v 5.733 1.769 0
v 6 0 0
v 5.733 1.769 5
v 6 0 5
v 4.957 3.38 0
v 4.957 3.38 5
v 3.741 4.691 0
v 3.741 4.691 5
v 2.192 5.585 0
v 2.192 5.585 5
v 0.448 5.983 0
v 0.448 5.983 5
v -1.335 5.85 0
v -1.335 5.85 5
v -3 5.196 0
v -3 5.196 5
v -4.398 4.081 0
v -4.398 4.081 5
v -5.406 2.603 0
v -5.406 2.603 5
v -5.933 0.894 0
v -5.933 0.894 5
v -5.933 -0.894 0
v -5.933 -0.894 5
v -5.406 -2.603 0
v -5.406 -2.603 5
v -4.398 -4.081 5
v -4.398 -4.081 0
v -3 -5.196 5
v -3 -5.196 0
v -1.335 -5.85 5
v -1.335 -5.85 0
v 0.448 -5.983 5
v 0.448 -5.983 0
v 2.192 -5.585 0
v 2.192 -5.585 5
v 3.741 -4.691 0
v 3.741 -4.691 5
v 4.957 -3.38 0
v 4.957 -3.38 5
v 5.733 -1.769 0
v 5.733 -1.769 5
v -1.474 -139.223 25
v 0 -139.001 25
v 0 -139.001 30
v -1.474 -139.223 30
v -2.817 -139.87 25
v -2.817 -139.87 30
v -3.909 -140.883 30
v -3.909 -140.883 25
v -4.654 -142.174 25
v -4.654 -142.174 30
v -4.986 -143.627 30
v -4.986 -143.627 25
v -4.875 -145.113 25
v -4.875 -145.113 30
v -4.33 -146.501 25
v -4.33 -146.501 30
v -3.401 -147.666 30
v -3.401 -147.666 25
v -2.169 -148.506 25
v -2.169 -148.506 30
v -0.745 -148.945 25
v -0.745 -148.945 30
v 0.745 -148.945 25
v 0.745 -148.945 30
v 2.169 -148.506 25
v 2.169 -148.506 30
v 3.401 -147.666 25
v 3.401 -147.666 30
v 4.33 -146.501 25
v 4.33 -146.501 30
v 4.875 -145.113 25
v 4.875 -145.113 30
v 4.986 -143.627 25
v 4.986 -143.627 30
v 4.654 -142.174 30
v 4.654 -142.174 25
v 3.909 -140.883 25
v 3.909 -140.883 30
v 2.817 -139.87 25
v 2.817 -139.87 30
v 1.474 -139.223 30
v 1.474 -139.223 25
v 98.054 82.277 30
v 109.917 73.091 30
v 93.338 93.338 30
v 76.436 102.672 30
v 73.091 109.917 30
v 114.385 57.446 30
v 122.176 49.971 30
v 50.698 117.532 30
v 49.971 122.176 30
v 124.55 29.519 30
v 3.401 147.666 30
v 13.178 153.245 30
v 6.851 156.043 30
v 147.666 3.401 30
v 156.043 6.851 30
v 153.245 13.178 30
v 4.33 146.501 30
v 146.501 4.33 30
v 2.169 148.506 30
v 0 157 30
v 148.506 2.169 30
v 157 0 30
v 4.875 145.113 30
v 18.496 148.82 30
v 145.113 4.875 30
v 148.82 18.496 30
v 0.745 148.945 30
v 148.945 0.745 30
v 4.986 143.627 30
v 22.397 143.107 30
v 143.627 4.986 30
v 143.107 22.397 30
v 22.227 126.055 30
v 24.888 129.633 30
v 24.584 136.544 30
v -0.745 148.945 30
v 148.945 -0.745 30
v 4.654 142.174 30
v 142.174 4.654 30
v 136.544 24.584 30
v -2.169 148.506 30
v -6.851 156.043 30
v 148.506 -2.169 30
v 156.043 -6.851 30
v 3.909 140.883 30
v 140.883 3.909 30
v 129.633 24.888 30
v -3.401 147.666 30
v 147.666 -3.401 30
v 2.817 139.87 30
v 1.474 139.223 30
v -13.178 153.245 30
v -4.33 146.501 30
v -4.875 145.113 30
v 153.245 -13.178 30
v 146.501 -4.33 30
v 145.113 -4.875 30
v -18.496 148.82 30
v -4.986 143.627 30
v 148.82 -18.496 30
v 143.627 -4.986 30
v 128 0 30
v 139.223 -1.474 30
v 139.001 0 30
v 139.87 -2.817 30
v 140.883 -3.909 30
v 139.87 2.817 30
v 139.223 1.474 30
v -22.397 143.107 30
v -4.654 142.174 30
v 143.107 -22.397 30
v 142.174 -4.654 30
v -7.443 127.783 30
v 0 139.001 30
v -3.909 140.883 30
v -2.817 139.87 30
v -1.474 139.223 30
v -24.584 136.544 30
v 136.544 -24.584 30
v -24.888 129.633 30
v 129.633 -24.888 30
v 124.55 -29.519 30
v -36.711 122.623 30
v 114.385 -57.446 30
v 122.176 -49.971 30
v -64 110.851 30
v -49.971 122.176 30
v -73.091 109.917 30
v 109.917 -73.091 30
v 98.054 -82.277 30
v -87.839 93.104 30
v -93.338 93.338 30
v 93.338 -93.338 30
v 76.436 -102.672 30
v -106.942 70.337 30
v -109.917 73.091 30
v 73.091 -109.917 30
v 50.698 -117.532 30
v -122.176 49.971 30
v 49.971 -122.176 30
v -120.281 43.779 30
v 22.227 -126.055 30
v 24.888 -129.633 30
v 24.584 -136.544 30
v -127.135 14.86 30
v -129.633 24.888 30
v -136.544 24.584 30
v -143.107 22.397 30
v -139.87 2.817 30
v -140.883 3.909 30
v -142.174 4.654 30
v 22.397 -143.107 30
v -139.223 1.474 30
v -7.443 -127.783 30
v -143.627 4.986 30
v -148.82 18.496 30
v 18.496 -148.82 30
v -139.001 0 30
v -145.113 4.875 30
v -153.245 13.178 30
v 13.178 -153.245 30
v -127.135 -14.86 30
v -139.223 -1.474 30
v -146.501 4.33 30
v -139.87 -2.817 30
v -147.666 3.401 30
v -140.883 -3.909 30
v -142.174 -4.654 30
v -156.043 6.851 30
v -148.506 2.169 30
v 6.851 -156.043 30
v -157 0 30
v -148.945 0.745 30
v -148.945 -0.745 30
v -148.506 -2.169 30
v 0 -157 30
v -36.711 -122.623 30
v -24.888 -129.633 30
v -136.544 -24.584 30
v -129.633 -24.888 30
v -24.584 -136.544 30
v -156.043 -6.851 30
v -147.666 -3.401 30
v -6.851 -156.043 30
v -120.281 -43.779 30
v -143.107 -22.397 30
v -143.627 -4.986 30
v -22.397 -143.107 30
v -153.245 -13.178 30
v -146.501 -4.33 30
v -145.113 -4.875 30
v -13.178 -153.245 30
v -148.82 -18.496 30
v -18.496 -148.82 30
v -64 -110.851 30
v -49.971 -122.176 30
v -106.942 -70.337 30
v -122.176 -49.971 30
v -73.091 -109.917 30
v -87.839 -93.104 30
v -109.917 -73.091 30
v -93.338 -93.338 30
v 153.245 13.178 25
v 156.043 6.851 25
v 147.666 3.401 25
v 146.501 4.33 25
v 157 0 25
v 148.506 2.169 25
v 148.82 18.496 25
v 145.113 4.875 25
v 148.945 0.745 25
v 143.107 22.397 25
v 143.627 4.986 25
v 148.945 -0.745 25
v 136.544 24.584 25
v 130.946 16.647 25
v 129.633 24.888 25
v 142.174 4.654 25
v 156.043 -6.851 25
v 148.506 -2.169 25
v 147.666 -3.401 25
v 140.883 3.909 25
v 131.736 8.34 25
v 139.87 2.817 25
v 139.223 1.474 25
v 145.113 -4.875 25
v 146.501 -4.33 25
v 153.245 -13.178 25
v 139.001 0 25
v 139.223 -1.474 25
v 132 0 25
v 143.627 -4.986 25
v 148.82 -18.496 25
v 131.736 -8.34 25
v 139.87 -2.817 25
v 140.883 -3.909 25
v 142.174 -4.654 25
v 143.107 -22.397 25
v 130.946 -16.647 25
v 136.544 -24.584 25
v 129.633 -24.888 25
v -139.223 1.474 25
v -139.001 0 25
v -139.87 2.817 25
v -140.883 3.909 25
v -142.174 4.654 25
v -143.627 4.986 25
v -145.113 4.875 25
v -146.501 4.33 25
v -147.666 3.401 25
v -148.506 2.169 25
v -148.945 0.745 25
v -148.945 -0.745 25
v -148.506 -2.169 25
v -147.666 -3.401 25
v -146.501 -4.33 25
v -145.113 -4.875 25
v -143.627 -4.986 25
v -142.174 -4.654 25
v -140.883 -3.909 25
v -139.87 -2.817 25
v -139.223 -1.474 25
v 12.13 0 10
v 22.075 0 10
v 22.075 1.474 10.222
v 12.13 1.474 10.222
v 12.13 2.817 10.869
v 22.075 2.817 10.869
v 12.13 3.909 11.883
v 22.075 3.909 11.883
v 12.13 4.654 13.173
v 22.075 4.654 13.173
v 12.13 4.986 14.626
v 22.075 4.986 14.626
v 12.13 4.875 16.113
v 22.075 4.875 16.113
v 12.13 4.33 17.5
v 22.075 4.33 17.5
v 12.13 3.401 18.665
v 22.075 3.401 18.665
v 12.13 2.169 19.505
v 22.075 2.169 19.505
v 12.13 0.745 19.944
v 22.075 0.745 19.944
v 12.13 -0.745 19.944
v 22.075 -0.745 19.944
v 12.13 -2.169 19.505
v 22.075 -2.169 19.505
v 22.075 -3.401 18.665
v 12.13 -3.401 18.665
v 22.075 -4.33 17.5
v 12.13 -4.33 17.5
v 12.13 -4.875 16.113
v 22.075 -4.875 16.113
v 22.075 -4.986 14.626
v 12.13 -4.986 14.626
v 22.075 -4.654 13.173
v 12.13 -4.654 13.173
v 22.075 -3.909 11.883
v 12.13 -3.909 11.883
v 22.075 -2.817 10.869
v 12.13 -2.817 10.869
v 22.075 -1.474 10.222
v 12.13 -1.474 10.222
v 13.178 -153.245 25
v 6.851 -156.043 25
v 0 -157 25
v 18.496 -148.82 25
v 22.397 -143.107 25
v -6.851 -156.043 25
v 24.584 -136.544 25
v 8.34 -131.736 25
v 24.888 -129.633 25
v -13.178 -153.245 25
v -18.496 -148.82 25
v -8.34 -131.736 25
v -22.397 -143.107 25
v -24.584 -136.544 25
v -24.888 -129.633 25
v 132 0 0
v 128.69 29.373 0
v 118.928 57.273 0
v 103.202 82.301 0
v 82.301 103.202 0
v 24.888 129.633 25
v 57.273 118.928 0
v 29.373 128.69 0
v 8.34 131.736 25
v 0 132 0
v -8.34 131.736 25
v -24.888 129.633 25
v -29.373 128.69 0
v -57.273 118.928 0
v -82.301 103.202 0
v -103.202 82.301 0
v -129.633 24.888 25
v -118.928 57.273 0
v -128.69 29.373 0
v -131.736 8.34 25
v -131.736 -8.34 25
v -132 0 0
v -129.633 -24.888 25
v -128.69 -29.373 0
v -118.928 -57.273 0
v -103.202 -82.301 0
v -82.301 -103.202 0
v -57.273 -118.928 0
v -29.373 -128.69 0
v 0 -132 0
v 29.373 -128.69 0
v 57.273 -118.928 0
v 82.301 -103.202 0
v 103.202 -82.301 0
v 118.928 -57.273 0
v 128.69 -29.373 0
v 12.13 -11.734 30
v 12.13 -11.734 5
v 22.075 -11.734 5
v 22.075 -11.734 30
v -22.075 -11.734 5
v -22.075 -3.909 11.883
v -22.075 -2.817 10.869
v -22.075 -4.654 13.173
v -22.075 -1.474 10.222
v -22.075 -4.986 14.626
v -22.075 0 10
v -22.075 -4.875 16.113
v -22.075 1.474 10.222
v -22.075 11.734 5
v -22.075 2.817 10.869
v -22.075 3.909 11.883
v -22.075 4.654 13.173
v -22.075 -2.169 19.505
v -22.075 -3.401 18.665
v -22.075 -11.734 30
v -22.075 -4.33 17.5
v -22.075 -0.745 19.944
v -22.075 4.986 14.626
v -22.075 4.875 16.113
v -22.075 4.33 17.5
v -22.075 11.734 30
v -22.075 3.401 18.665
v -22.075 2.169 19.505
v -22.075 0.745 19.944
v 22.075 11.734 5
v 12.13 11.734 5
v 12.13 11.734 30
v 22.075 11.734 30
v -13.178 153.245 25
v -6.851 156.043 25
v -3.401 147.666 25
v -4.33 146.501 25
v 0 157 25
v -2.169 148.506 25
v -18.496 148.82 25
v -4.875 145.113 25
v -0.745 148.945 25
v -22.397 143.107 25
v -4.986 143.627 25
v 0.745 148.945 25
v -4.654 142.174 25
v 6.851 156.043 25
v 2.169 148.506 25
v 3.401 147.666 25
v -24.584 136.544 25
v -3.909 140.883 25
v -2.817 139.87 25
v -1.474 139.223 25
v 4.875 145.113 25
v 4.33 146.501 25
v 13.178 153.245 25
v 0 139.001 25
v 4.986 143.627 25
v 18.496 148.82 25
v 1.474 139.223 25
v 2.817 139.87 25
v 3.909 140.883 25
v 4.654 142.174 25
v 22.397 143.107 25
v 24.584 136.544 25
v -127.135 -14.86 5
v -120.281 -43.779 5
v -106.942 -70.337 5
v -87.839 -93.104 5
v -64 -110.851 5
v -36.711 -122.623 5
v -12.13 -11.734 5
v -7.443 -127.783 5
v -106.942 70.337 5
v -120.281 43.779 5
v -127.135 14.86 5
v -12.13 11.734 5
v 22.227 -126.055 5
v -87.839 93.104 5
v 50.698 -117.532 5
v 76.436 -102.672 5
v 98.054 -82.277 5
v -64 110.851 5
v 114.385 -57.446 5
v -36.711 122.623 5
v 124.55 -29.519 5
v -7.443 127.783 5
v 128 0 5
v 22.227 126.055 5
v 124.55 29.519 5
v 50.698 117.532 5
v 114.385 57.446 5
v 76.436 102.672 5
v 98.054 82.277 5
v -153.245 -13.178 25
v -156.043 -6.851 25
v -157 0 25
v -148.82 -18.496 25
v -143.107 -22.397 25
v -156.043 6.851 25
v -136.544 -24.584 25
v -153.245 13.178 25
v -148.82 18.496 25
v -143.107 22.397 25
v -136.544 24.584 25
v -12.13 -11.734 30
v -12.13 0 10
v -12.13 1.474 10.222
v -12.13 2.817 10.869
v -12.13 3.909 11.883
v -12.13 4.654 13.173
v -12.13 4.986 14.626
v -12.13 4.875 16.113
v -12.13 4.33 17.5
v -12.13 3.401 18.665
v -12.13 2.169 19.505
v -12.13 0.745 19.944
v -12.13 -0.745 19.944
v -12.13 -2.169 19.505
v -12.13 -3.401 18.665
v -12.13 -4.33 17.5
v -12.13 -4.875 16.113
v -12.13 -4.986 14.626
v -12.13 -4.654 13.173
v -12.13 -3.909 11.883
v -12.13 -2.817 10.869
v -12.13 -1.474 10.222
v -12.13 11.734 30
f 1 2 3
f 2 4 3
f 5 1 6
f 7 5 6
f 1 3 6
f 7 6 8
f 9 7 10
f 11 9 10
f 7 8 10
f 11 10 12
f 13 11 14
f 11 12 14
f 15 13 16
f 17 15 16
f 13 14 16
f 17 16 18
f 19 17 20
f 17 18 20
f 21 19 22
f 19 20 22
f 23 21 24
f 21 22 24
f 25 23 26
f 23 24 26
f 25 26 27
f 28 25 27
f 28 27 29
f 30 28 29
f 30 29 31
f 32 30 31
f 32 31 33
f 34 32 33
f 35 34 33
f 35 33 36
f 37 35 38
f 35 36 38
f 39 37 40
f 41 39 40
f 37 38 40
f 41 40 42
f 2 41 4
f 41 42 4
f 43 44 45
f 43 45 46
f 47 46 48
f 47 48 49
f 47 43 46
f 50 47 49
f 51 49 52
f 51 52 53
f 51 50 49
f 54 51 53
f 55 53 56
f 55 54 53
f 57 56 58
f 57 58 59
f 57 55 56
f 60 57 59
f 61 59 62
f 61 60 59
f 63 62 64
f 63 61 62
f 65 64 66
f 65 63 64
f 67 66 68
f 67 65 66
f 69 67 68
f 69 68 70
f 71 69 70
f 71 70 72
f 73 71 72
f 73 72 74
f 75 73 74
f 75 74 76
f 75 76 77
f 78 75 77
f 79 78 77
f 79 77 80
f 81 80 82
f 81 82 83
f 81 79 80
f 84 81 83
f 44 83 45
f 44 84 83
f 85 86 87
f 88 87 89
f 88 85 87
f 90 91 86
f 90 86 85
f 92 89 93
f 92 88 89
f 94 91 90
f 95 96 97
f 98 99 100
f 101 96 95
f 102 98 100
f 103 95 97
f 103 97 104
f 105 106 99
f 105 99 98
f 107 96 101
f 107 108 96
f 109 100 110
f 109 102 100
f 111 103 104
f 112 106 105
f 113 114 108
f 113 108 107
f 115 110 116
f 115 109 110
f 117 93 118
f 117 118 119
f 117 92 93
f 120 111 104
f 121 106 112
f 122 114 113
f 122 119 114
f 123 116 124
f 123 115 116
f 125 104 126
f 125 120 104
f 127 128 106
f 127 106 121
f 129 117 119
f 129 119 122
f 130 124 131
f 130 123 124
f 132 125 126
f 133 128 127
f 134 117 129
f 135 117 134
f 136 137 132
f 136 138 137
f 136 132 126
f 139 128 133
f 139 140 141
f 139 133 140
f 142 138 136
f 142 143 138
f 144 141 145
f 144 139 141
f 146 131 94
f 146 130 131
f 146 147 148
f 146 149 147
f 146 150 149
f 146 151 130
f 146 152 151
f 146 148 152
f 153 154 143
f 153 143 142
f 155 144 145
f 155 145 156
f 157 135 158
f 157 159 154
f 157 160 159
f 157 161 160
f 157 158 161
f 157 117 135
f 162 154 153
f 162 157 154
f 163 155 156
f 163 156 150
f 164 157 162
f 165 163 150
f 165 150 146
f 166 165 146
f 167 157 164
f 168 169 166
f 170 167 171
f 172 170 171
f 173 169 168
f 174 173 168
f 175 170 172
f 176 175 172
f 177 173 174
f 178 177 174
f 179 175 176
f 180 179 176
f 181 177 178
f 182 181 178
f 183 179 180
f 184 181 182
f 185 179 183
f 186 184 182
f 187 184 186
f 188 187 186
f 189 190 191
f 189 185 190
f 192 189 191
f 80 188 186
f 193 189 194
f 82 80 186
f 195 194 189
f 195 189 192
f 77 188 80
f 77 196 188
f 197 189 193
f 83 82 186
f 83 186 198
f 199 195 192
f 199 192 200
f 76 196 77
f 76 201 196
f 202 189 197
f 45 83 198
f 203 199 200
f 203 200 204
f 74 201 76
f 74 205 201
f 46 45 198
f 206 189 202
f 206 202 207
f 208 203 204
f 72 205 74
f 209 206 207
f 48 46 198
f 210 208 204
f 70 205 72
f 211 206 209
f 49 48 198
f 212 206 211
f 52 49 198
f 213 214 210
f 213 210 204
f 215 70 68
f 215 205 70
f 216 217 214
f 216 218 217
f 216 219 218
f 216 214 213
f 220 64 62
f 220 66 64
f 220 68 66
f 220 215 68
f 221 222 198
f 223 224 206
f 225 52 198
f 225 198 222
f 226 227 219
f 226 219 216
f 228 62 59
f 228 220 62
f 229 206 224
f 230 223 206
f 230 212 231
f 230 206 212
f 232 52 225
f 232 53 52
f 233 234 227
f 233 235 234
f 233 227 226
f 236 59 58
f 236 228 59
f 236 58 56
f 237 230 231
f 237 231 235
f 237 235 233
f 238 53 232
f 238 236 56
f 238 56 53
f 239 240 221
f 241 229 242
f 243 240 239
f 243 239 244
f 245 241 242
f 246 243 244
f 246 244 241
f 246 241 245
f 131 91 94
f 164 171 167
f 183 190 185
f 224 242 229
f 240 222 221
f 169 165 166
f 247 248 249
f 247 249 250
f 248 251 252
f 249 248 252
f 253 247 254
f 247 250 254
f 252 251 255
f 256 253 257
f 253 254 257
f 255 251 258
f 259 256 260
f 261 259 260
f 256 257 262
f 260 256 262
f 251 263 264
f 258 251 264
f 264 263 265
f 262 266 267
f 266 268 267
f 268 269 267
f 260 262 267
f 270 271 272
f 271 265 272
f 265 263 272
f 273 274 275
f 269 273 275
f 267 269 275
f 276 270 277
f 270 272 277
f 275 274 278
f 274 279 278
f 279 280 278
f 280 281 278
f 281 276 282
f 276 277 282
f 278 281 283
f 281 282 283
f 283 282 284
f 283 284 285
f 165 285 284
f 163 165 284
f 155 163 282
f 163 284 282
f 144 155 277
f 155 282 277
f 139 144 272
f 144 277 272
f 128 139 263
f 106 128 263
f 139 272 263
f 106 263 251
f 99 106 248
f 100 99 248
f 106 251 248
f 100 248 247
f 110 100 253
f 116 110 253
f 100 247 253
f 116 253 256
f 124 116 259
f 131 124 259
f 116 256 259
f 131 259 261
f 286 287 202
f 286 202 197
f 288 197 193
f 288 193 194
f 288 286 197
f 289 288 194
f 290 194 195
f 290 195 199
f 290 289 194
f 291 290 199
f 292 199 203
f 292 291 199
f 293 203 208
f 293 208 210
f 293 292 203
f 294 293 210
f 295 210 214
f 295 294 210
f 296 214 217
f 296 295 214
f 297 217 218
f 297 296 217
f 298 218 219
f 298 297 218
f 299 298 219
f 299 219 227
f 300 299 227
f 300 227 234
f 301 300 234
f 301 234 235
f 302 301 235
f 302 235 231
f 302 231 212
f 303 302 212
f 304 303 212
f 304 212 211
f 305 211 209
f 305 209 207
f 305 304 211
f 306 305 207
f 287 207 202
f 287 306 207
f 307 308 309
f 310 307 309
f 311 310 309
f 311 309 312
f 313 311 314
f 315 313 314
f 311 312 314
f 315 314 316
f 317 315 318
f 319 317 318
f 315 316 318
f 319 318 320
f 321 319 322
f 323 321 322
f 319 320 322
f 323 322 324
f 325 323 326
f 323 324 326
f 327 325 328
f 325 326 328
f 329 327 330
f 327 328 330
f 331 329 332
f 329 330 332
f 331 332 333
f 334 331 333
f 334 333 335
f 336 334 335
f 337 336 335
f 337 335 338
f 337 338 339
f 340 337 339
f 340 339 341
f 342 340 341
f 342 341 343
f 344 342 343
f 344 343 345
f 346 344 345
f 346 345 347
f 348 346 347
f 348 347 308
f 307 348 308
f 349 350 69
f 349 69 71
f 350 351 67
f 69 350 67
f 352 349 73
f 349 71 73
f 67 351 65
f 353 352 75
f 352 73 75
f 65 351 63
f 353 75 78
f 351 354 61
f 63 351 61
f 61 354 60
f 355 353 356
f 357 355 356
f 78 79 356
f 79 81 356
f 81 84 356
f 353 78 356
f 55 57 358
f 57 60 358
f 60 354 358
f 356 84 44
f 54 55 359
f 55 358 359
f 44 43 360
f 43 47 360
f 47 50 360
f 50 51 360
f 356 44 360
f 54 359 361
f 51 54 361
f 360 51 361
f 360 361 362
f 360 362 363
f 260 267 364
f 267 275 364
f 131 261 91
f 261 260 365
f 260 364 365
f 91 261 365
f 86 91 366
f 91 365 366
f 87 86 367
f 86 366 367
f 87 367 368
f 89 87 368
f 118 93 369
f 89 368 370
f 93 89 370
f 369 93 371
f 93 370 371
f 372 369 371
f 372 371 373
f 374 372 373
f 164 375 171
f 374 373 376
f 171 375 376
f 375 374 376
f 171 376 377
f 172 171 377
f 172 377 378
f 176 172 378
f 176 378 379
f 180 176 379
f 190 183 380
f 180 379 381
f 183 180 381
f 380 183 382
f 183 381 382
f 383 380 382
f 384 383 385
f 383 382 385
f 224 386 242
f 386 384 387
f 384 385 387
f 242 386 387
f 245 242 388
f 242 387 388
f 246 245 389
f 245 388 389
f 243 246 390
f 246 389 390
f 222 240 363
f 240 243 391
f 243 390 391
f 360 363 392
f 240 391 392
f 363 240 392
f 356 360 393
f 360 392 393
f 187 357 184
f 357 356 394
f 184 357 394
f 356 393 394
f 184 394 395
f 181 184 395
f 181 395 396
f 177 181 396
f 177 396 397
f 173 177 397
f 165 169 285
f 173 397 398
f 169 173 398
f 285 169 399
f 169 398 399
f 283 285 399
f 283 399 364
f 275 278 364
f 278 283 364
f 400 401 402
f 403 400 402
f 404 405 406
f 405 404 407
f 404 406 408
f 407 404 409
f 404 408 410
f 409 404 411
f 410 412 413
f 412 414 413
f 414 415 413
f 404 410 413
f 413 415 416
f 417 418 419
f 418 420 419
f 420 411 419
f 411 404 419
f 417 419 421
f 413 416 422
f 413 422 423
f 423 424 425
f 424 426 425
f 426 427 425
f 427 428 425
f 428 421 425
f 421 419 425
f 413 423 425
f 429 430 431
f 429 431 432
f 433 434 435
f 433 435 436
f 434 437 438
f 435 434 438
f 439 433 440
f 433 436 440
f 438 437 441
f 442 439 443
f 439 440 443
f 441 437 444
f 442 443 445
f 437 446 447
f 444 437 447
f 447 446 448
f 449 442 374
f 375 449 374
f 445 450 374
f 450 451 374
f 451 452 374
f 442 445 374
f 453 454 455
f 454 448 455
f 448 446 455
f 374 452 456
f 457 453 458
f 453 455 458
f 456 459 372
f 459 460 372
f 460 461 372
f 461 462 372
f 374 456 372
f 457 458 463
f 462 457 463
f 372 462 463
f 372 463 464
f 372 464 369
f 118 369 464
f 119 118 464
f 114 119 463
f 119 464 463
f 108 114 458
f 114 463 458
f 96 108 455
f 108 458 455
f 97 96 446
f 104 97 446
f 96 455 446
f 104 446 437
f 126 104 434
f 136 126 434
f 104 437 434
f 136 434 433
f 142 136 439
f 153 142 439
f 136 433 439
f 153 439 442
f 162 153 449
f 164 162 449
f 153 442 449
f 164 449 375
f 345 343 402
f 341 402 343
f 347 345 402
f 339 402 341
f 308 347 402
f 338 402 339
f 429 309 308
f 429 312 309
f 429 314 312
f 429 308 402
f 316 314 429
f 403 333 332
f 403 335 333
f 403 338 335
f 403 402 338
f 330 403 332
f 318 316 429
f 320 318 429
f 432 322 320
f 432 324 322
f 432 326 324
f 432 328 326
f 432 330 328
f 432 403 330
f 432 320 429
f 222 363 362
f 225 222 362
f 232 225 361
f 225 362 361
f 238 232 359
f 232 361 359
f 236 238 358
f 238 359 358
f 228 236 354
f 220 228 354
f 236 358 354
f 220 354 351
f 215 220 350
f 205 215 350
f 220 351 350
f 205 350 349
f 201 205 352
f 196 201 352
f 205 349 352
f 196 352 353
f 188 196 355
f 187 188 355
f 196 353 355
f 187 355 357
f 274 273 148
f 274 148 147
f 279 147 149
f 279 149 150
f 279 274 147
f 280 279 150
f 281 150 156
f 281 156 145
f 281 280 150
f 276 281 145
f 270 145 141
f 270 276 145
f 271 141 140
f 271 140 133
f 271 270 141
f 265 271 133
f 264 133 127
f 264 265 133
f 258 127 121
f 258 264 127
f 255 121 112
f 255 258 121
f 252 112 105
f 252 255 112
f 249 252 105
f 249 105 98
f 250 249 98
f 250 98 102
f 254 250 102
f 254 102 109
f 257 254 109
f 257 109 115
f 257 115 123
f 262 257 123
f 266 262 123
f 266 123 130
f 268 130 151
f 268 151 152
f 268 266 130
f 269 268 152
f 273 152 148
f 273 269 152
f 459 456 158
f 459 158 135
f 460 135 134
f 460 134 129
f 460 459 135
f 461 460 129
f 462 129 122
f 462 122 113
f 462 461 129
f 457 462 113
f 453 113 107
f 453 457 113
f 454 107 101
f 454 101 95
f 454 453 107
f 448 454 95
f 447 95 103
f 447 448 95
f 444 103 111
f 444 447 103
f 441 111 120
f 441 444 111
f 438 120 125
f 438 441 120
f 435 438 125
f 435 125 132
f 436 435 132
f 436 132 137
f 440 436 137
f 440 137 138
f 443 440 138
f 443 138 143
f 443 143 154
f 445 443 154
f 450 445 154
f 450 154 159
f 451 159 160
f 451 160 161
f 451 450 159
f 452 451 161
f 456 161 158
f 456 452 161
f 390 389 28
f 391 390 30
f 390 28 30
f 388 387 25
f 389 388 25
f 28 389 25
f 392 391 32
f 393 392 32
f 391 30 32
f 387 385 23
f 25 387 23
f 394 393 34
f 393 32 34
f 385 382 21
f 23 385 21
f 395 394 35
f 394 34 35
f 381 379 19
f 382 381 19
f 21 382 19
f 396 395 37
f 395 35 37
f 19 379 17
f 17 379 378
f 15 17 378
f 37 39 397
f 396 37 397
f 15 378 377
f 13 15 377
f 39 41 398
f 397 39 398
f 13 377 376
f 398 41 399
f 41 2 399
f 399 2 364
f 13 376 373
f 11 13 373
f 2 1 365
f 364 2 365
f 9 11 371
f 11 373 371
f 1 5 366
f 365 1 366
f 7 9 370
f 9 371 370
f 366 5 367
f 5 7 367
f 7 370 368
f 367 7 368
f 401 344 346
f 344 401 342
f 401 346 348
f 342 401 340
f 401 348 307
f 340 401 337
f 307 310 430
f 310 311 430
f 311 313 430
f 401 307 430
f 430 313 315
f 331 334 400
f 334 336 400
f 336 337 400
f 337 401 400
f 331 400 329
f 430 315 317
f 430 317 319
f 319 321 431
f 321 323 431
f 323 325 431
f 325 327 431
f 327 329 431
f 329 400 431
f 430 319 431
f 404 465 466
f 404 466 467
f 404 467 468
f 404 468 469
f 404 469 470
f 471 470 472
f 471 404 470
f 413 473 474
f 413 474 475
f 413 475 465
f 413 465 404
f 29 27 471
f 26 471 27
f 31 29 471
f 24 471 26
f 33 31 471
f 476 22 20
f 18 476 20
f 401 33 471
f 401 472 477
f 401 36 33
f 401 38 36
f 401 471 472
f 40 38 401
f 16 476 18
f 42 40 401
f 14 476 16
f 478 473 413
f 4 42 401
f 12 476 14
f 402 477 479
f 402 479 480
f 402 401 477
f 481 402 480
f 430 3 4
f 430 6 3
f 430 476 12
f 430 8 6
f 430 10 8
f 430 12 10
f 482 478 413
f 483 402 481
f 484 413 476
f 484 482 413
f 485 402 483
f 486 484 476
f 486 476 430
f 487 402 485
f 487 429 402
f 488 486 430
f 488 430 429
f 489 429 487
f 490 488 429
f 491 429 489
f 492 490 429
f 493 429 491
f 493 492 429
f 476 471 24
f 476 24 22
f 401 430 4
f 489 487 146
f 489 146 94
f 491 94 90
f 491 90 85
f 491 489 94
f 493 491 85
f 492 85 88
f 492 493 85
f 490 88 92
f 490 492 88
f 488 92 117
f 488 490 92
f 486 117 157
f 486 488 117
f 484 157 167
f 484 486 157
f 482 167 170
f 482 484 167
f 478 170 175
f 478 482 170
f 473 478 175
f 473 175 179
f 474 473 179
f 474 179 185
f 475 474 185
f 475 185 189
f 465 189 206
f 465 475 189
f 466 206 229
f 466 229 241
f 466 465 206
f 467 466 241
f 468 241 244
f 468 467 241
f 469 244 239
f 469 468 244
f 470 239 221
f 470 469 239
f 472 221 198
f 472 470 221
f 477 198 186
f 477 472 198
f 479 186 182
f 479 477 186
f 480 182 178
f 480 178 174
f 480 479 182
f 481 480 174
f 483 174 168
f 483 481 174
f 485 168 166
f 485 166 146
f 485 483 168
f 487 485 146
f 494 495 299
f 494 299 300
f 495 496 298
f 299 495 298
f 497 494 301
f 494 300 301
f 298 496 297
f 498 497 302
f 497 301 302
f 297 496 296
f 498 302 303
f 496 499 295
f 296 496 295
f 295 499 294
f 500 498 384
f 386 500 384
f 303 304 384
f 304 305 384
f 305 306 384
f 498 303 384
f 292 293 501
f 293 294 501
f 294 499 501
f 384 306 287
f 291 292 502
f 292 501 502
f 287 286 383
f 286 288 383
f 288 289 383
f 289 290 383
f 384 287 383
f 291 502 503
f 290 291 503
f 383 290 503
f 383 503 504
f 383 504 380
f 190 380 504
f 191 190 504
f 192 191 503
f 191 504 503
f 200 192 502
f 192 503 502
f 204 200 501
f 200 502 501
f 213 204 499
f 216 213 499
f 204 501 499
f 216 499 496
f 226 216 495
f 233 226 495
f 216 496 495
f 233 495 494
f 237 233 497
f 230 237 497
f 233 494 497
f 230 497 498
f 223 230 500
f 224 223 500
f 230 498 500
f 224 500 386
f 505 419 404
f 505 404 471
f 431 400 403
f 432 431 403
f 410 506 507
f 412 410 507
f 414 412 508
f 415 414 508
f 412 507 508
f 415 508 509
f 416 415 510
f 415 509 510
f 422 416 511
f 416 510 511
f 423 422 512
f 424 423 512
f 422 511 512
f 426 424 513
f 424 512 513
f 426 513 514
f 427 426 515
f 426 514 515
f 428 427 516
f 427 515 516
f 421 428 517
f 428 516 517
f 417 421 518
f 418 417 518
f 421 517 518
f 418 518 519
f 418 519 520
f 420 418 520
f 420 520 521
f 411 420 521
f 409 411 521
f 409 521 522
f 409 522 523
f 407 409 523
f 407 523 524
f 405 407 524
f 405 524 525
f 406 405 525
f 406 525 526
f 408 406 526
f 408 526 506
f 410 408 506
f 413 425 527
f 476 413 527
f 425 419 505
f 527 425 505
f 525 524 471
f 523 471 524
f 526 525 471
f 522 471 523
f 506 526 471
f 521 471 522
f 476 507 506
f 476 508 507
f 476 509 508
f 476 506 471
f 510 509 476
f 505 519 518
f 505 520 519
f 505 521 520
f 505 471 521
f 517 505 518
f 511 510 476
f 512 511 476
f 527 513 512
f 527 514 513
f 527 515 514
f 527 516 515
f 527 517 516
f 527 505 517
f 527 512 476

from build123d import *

# Parameters (mm, degrees)
SKETCH1_R           = 132
BOSS_EXTRUDE1_DEPTH = 5
SKETCH2_R           = 132
SKETCH2_R_2         = 128
BOSS_EXTRUDE2_DEPTH = 25
SKETCH3_R           = 25
BOSS_EXTRUDE3_DEPTH = 25
SKETCH4_W           = 24.259702766
SKETCH4_H           = 53.634785552
CUT_EXTRUDE1_DEPTH  = 25
SKETCH5_W           = 53.321862162
SKETCH5_H           = 77.08657154
SKETCH5_W_2         = 44.150486072
SKETCH5_H_2         = 70.031666854
CUT_EXTRUDE2_DEPTH  = 25
SKETCH6_W           = 57.100495662
SKETCH6_H           = 46.822548266
SKETCH6_W_2         = 44.150486072
SKETCH6_H_2         = 23.467734864
CUT_EXTRUDE4_DEPTH  = 25
SKETCH7_R           = 5
CUT_EXTRUDE5_DEPTH  = 60
SKETCH8_R           = 6
CUT_EXTRUDE6_DEPTH  = 30
BOSS_EXTRUDE4_START = -5
SKETCH9_R           = 5
BOSS_EXTRUDE4_DEPTH = 5
CIRPATTERN1_COUNT   = 4


with BuildPart() as part:
    # Sketch1 → Boss-Extrude1 (new body)
    with BuildSketch(Plane.XY):
        Circle(SKETCH1_R)
    extrude(amount=BOSS_EXTRUDE1_DEPTH)

    # Sketch2 → Boss-Extrude2 (add)
    with BuildSketch(Plane.XY.offset(5)):
        Circle(SKETCH2_R)
        Circle(SKETCH2_R_2, mode=Mode.SUBTRACT)
    extrude(amount=BOSS_EXTRUDE2_DEPTH)

    # Sketch3 → Boss-Extrude3 (add)
    with BuildSketch(Plane.XY.offset(5)):
        Circle(SKETCH3_R)
    extrude(amount=BOSS_EXTRUDE3_DEPTH)

    # Sketch4 → Cut-Extrude1 (cut)
    with BuildSketch(Plane.XY.offset(30)):
        Rectangle(SKETCH4_W, SKETCH4_H)
    extrude(amount=-CUT_EXTRUDE1_DEPTH, mode=Mode.SUBTRACT)

    # Sketch5 → Cut-Extrude2 (cut)
    with BuildSketch(Plane.XY.offset(30)):
        Rectangle(SKETCH5_W, SKETCH5_H)
        Rectangle(SKETCH5_W_2, SKETCH5_H_2, mode=Mode.SUBTRACT)
    extrude(amount=-CUT_EXTRUDE2_DEPTH, mode=Mode.SUBTRACT)

    # Sketch6 → Cut-Extrude4 (cut)
    with BuildSketch(Plane.XY.offset(30)):
        Rectangle(SKETCH6_W, SKETCH6_H)
        Rectangle(SKETCH6_W_2, SKETCH6_H_2, mode=Mode.SUBTRACT)
    extrude(amount=-CUT_EXTRUDE4_DEPTH, mode=Mode.SUBTRACT)

    # Sketch7 → Cut-Extrude5 (cut)
    with BuildSketch(Plane(origin=(22.075243036, 0, 0), x_dir=(0, 0, -1), z_dir=(1, 0, 0))):
        with Locations((-15, 0)):
            Circle(SKETCH7_R)
    extrude(amount=-CUT_EXTRUDE5_DEPTH, mode=Mode.SUBTRACT)

    # Sketch8 → Cut-Extrude6 (cut, symmetric)
    with BuildSketch(Plane.XY.offset(5)):
        Circle(SKETCH8_R)
    extrude(amount=CUT_EXTRUDE6_DEPTH, both=True, mode=Mode.SUBTRACT)

    # Sketch9 → Boss-Extrude4 (add)
    with BuildSketch(Plane.XY.offset(30).offset(BOSS_EXTRUDE4_START)):
        with BuildLine():
            ThreePointArc((-129.632575758, -24.887653615), (-132, 0), (-129.632575758, 24.887653615))
            ThreePointArc((-129.632575758, 24.887653615), (-157, 0), (-129.632575758, -24.887653615))
        make_face()
        with Locations((-144.000711393, 0)):
            Circle(SKETCH9_R, mode=Mode.SUBTRACT)
    boss_extrude4 = extrude(amount=BOSS_EXTRUDE4_DEPTH)

    # CirPattern1: Boss-Extrude4 ×4 about axis
    cirpattern1_axis = Axis((0, 0, 0), (0, 0, 1))
    for i in range(1, CIRPATTERN1_COUNT):
        add(boss_extrude4.rotate(cirpattern1_axis, i * 360 / CIRPATTERN1_COUNT))


solid = part.part
